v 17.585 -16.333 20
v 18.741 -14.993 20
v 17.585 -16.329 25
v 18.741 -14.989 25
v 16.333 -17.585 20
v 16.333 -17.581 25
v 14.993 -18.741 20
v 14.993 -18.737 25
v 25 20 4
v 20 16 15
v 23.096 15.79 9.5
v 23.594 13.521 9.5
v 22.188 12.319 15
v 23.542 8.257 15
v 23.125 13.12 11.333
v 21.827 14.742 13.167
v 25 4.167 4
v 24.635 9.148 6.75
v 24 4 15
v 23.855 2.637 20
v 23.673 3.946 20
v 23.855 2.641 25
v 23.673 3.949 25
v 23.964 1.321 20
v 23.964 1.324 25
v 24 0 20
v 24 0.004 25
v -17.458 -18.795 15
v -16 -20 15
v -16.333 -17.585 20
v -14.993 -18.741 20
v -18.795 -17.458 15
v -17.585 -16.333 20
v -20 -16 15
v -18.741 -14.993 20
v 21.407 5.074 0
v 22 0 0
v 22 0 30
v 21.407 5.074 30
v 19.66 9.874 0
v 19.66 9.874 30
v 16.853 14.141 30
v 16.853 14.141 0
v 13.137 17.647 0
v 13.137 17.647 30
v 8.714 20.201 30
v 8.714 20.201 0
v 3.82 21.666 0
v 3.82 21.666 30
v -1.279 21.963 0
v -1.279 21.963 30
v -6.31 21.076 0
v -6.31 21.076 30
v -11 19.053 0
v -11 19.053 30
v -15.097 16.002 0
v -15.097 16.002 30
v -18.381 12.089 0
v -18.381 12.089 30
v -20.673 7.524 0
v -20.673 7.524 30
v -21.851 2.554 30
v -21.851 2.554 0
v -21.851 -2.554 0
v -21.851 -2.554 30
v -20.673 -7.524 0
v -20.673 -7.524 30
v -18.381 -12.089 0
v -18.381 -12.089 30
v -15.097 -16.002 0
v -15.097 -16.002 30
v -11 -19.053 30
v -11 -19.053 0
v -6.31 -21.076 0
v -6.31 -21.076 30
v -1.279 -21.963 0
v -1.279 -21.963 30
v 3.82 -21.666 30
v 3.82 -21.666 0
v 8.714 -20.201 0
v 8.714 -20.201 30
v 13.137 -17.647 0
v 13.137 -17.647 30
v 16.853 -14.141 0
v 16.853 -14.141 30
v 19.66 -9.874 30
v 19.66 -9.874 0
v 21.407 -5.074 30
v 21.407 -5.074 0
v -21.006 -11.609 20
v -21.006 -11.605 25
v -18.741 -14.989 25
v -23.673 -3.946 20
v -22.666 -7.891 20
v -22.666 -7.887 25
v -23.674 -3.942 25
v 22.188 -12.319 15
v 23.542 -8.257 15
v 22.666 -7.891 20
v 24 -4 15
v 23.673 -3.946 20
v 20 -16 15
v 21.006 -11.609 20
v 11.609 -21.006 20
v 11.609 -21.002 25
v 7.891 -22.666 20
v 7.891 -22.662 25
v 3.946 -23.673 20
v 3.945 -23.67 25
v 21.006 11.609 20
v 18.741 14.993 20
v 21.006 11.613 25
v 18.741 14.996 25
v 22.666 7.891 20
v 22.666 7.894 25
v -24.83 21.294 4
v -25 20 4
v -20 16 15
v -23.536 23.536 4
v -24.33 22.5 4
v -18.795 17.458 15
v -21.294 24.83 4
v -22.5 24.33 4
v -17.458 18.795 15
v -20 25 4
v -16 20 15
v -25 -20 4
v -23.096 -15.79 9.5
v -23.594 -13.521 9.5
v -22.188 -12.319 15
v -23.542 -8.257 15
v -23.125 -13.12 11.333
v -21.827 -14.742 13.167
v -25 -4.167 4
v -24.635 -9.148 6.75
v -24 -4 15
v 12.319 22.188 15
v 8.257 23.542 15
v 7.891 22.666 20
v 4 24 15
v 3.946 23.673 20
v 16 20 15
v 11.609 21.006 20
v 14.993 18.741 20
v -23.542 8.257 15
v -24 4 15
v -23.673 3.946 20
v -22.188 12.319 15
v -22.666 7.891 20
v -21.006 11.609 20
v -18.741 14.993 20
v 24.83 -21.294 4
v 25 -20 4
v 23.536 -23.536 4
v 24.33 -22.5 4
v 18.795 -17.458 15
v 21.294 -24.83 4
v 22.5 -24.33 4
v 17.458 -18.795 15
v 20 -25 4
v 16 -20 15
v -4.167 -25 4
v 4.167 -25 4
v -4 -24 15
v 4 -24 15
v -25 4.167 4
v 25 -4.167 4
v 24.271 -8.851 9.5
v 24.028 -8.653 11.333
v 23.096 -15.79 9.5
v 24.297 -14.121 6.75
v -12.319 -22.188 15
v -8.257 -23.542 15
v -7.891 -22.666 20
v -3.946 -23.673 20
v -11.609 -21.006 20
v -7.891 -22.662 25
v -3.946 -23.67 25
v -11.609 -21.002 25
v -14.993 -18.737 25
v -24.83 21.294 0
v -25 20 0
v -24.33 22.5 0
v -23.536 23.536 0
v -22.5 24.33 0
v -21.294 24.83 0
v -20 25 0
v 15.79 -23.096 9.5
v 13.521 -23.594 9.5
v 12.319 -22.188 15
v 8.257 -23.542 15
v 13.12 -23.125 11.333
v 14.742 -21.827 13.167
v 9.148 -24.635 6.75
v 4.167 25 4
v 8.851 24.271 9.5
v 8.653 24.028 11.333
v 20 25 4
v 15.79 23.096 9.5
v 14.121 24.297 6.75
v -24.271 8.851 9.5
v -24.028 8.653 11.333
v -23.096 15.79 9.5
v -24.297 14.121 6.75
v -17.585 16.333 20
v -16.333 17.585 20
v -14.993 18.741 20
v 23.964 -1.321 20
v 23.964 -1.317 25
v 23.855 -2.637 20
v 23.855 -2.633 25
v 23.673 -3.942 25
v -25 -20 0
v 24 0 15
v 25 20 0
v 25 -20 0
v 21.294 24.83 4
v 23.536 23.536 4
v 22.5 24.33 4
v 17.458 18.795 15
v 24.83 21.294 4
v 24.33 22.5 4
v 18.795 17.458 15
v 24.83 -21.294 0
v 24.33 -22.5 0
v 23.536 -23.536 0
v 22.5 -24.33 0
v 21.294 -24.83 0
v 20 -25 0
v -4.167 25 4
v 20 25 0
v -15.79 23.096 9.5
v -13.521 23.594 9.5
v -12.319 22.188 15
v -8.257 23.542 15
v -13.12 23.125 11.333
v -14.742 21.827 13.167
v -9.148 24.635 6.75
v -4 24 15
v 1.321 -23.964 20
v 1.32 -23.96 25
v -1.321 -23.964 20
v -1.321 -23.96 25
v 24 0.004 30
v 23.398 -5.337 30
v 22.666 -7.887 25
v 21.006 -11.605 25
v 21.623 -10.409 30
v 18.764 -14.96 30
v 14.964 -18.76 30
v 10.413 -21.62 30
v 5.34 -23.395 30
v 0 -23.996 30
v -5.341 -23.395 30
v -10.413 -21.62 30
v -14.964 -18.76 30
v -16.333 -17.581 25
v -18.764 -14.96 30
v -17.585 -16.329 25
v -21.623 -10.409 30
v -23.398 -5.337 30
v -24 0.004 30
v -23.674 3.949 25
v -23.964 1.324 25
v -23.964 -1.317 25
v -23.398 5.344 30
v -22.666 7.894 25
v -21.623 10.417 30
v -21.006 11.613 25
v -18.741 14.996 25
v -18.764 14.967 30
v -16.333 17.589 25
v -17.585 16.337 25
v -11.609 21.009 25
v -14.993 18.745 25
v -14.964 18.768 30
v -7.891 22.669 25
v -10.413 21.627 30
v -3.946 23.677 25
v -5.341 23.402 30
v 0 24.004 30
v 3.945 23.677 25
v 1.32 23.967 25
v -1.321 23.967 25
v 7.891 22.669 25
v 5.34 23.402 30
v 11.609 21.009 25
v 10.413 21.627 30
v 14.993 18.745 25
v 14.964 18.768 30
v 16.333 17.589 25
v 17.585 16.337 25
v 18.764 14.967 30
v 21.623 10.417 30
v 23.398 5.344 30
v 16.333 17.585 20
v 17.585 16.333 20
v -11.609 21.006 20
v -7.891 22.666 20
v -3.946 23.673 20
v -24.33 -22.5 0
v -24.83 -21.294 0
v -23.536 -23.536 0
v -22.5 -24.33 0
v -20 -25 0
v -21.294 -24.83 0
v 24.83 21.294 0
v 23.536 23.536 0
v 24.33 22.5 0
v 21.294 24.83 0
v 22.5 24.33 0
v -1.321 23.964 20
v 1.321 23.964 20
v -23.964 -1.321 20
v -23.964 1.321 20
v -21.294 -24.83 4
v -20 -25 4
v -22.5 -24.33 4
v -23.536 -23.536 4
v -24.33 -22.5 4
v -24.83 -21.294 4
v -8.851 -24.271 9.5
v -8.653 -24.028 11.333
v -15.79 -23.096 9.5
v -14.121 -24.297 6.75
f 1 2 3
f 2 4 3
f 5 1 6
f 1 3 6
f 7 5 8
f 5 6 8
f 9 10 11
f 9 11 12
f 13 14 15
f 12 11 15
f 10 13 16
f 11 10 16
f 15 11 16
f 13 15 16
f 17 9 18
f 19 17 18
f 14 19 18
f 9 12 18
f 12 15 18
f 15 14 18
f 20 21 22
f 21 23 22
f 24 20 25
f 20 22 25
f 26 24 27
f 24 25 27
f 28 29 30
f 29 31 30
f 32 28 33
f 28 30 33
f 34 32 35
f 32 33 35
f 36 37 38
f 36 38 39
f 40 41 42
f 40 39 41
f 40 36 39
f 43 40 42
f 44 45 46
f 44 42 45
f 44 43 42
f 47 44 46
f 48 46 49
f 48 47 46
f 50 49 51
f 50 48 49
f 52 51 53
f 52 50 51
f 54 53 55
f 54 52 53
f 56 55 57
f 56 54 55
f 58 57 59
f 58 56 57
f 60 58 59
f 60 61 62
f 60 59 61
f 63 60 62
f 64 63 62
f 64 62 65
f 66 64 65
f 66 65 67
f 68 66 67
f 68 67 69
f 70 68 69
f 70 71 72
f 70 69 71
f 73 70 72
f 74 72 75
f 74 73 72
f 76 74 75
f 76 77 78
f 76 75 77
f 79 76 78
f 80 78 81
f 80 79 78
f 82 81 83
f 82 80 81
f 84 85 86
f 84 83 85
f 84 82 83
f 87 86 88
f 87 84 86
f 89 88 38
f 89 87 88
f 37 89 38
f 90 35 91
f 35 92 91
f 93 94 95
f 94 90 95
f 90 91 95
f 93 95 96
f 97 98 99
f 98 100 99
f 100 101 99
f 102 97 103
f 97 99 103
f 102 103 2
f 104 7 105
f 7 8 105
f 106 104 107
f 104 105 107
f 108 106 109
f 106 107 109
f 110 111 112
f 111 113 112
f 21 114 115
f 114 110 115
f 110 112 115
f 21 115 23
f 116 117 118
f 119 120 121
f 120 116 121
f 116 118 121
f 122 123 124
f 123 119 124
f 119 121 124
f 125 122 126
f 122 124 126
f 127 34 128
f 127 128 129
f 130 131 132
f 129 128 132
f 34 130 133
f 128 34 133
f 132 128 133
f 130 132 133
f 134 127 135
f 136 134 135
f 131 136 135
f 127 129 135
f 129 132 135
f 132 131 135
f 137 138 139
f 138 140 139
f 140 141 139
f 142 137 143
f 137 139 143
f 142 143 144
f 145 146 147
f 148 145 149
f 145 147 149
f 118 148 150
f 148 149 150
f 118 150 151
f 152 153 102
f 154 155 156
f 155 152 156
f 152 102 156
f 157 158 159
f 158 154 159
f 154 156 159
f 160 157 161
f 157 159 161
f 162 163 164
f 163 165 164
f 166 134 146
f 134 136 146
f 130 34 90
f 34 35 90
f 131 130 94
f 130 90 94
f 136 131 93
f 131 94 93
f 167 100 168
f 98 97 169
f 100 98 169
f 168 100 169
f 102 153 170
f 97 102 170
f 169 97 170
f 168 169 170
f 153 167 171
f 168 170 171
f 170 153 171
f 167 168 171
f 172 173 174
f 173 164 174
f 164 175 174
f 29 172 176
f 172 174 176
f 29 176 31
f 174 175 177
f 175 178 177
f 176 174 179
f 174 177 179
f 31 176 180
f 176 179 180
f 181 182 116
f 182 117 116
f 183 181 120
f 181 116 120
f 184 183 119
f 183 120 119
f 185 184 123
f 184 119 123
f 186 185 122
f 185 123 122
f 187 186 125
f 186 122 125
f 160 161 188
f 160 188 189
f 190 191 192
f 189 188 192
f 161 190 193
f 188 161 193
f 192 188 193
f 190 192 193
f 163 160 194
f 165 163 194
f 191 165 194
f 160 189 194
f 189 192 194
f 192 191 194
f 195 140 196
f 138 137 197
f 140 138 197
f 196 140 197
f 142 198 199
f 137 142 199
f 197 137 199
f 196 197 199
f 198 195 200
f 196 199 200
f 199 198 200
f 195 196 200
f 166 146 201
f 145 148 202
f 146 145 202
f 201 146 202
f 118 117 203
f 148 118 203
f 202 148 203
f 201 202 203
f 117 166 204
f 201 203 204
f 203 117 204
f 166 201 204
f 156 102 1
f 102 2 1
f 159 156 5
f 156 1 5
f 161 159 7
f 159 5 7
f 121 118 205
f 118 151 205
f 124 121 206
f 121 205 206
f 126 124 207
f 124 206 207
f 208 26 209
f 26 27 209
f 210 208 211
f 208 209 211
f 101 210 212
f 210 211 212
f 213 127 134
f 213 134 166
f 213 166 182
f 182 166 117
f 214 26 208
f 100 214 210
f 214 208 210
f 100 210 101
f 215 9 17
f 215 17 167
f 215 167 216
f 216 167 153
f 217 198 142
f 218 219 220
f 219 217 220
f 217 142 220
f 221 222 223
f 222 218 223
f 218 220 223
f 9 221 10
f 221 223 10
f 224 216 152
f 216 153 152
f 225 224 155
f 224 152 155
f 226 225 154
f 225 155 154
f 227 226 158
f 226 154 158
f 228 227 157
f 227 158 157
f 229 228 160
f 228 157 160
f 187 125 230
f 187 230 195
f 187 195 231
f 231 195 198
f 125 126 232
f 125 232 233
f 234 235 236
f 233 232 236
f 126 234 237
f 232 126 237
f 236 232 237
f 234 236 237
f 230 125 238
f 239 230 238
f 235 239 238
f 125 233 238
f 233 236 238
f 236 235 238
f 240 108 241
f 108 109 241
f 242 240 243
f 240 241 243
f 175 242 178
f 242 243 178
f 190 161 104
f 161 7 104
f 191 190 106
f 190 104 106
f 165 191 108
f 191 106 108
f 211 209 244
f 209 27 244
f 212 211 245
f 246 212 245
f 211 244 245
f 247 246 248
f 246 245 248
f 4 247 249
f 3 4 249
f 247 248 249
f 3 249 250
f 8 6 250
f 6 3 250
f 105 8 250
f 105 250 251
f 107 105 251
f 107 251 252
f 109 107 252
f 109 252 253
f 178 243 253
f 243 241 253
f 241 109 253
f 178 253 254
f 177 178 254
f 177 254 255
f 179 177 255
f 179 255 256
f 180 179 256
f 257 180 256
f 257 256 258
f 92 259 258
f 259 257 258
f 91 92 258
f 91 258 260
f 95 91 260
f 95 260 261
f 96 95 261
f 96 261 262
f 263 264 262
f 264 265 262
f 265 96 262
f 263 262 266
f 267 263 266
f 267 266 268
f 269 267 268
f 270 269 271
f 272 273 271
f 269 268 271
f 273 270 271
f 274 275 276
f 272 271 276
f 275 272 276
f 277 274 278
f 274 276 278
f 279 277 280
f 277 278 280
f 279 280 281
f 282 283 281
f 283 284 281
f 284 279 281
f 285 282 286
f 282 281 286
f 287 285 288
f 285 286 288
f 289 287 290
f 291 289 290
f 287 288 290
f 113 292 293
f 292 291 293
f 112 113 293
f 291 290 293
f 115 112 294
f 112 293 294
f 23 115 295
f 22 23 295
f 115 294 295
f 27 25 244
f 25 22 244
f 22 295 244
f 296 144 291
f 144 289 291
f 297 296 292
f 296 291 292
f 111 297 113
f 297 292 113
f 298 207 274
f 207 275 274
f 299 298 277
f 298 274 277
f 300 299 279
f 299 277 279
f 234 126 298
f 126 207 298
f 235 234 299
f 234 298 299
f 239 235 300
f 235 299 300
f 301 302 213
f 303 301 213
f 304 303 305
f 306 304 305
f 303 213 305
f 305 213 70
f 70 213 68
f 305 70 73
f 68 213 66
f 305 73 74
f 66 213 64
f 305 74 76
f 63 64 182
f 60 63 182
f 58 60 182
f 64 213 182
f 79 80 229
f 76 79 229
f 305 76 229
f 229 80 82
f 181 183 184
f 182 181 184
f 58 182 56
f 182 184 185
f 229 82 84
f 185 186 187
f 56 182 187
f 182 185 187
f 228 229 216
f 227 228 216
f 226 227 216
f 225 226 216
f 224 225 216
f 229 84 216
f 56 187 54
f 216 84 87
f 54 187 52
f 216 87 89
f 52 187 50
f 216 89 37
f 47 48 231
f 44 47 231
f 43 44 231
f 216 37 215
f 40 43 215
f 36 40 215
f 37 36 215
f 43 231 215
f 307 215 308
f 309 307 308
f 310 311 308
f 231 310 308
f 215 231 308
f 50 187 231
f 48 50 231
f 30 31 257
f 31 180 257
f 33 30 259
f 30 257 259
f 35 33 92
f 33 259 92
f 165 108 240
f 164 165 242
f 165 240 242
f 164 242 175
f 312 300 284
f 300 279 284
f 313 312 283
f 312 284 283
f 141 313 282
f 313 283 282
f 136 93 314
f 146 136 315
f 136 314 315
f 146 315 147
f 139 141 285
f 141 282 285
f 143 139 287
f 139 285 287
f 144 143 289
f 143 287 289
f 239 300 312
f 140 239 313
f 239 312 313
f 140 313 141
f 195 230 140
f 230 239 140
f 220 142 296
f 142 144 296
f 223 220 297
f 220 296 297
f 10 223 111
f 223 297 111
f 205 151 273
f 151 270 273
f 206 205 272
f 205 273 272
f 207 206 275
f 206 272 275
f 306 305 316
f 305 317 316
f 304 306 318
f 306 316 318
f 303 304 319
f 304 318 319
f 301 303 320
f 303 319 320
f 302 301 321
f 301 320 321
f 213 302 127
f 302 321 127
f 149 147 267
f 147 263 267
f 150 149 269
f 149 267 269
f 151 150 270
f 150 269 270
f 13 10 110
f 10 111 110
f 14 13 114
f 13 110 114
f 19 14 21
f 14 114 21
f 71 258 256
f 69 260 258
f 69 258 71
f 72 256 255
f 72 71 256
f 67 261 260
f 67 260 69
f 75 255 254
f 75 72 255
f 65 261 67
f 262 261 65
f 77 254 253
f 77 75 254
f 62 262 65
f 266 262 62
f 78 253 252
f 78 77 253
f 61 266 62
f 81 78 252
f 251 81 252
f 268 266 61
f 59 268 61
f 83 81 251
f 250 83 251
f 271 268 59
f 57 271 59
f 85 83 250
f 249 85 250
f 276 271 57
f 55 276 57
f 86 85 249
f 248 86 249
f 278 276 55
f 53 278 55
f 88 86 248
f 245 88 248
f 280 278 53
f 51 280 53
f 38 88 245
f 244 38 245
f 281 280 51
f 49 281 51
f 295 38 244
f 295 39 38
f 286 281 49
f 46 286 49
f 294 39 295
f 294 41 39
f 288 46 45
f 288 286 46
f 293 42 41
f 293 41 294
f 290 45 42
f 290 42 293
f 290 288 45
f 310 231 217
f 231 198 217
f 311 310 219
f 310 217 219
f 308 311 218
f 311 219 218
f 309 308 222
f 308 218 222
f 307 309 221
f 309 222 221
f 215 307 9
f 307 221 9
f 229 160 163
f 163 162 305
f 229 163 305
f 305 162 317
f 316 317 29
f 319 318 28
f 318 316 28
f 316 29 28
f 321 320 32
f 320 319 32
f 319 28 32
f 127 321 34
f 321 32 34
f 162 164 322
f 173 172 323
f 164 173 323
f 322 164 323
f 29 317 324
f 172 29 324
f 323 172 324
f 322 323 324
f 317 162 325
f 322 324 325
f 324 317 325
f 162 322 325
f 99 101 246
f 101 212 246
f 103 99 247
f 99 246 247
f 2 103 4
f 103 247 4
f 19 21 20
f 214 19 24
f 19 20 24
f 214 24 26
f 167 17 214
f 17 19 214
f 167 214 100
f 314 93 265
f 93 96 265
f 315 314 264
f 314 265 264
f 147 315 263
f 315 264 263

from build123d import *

# Parameters (mm, degrees)
CYLINDER_R     = 22
CYLINDER_DEPTH = 90
SKETCH002_R    = 24
SKETCH003_R    = 24
SKETCH004_R    = 24


with BuildPart() as cylinder:
    # Cylinder → Cylinder (new body)
    with BuildSketch(Plane.XY.offset(-12)):
        Circle(CYLINDER_R)
    extrude(amount=CYLINDER_DEPTH)


with BuildPart() as soporte:
    # Sketch → Loft section 0
    with BuildSketch(Plane.XY):
        with BuildLine():
            Line((-20, 25), (20, 25))
            ThreePointArc((25, 20), (23.535534, 23.535534), (20, 25))
            Line((25, 20), (25, -20))
            ThreePointArc((20, -25), (23.535534, -23.535534), (25, -20))
            Line((20, -25), (-20, -25))
            ThreePointArc((-25, -20), (-23.535534, -23.535534), (-20, -25))
            Line((-25, -20), (-25, 20))
            ThreePointArc((-20, 25), (-23.535534, 23.535534), (-25, 20))
        make_face()
    # Sketch005 → Loft section 1
    with BuildSketch(Plane.XY.offset(4)):
        with BuildLine():
            Line((-20, 25), (20, 25))
            ThreePointArc((25, 20), (23.535534, 23.535534), (20, 25))
            Line((25, 20), (25, -20))
            ThreePointArc((20, -25), (23.535534, -23.535534), (25, -20))
            Line((20, -25), (-20, -25))
            ThreePointArc((-25, -20), (-23.535534, -23.535534), (-20, -25))
            Line((-25, -20), (-25, 20))
            ThreePointArc((-20, 25), (-23.535534, 23.535534), (-25, 20))
        make_face()
    # Sketch006 → Loft section 2
    with BuildSketch(Plane.XY.offset(15)):
        with BuildLine():
            Line((-4, 24), (4, 24))
            ThreePointArc((24, 4), (18.142136, 18.142136), (4, 24))
            Line((24, 4), (24, -4))
            ThreePointArc((4, -24), (18.142136, -18.142136), (24, -4))
            Line((4, -24), (-4, -24))
            ThreePointArc((-24, -4), (-18.142136, -18.142136), (-4, -24))
            Line((-24, -4), (-24, 4))
            ThreePointArc((-4, 24), (-18.142136, 18.142136), (-24, 4))
        make_face()
    # Sketch002 → Loft section 3
    with BuildSketch(Plane.XY.offset(20)):
        Circle(SKETCH002_R)
    # Sketch003 → Loft section 4
    with BuildSketch(Plane.XY.offset(25)):
        with Locations((-0.000114, 0.003714)):
            Circle(SKETCH003_R)
    # Sketch004 → Loft section 5
    with BuildSketch(Plane.XY.offset(30)):
        with Locations((-0.000114, 0.003714)):
            Circle(SKETCH004_R)
    loft(ruled=True)

    # Cut: cut Cylinder
    add(cylinder.part, mode=Mode.SUBTRACT)


solid = soporte.part
